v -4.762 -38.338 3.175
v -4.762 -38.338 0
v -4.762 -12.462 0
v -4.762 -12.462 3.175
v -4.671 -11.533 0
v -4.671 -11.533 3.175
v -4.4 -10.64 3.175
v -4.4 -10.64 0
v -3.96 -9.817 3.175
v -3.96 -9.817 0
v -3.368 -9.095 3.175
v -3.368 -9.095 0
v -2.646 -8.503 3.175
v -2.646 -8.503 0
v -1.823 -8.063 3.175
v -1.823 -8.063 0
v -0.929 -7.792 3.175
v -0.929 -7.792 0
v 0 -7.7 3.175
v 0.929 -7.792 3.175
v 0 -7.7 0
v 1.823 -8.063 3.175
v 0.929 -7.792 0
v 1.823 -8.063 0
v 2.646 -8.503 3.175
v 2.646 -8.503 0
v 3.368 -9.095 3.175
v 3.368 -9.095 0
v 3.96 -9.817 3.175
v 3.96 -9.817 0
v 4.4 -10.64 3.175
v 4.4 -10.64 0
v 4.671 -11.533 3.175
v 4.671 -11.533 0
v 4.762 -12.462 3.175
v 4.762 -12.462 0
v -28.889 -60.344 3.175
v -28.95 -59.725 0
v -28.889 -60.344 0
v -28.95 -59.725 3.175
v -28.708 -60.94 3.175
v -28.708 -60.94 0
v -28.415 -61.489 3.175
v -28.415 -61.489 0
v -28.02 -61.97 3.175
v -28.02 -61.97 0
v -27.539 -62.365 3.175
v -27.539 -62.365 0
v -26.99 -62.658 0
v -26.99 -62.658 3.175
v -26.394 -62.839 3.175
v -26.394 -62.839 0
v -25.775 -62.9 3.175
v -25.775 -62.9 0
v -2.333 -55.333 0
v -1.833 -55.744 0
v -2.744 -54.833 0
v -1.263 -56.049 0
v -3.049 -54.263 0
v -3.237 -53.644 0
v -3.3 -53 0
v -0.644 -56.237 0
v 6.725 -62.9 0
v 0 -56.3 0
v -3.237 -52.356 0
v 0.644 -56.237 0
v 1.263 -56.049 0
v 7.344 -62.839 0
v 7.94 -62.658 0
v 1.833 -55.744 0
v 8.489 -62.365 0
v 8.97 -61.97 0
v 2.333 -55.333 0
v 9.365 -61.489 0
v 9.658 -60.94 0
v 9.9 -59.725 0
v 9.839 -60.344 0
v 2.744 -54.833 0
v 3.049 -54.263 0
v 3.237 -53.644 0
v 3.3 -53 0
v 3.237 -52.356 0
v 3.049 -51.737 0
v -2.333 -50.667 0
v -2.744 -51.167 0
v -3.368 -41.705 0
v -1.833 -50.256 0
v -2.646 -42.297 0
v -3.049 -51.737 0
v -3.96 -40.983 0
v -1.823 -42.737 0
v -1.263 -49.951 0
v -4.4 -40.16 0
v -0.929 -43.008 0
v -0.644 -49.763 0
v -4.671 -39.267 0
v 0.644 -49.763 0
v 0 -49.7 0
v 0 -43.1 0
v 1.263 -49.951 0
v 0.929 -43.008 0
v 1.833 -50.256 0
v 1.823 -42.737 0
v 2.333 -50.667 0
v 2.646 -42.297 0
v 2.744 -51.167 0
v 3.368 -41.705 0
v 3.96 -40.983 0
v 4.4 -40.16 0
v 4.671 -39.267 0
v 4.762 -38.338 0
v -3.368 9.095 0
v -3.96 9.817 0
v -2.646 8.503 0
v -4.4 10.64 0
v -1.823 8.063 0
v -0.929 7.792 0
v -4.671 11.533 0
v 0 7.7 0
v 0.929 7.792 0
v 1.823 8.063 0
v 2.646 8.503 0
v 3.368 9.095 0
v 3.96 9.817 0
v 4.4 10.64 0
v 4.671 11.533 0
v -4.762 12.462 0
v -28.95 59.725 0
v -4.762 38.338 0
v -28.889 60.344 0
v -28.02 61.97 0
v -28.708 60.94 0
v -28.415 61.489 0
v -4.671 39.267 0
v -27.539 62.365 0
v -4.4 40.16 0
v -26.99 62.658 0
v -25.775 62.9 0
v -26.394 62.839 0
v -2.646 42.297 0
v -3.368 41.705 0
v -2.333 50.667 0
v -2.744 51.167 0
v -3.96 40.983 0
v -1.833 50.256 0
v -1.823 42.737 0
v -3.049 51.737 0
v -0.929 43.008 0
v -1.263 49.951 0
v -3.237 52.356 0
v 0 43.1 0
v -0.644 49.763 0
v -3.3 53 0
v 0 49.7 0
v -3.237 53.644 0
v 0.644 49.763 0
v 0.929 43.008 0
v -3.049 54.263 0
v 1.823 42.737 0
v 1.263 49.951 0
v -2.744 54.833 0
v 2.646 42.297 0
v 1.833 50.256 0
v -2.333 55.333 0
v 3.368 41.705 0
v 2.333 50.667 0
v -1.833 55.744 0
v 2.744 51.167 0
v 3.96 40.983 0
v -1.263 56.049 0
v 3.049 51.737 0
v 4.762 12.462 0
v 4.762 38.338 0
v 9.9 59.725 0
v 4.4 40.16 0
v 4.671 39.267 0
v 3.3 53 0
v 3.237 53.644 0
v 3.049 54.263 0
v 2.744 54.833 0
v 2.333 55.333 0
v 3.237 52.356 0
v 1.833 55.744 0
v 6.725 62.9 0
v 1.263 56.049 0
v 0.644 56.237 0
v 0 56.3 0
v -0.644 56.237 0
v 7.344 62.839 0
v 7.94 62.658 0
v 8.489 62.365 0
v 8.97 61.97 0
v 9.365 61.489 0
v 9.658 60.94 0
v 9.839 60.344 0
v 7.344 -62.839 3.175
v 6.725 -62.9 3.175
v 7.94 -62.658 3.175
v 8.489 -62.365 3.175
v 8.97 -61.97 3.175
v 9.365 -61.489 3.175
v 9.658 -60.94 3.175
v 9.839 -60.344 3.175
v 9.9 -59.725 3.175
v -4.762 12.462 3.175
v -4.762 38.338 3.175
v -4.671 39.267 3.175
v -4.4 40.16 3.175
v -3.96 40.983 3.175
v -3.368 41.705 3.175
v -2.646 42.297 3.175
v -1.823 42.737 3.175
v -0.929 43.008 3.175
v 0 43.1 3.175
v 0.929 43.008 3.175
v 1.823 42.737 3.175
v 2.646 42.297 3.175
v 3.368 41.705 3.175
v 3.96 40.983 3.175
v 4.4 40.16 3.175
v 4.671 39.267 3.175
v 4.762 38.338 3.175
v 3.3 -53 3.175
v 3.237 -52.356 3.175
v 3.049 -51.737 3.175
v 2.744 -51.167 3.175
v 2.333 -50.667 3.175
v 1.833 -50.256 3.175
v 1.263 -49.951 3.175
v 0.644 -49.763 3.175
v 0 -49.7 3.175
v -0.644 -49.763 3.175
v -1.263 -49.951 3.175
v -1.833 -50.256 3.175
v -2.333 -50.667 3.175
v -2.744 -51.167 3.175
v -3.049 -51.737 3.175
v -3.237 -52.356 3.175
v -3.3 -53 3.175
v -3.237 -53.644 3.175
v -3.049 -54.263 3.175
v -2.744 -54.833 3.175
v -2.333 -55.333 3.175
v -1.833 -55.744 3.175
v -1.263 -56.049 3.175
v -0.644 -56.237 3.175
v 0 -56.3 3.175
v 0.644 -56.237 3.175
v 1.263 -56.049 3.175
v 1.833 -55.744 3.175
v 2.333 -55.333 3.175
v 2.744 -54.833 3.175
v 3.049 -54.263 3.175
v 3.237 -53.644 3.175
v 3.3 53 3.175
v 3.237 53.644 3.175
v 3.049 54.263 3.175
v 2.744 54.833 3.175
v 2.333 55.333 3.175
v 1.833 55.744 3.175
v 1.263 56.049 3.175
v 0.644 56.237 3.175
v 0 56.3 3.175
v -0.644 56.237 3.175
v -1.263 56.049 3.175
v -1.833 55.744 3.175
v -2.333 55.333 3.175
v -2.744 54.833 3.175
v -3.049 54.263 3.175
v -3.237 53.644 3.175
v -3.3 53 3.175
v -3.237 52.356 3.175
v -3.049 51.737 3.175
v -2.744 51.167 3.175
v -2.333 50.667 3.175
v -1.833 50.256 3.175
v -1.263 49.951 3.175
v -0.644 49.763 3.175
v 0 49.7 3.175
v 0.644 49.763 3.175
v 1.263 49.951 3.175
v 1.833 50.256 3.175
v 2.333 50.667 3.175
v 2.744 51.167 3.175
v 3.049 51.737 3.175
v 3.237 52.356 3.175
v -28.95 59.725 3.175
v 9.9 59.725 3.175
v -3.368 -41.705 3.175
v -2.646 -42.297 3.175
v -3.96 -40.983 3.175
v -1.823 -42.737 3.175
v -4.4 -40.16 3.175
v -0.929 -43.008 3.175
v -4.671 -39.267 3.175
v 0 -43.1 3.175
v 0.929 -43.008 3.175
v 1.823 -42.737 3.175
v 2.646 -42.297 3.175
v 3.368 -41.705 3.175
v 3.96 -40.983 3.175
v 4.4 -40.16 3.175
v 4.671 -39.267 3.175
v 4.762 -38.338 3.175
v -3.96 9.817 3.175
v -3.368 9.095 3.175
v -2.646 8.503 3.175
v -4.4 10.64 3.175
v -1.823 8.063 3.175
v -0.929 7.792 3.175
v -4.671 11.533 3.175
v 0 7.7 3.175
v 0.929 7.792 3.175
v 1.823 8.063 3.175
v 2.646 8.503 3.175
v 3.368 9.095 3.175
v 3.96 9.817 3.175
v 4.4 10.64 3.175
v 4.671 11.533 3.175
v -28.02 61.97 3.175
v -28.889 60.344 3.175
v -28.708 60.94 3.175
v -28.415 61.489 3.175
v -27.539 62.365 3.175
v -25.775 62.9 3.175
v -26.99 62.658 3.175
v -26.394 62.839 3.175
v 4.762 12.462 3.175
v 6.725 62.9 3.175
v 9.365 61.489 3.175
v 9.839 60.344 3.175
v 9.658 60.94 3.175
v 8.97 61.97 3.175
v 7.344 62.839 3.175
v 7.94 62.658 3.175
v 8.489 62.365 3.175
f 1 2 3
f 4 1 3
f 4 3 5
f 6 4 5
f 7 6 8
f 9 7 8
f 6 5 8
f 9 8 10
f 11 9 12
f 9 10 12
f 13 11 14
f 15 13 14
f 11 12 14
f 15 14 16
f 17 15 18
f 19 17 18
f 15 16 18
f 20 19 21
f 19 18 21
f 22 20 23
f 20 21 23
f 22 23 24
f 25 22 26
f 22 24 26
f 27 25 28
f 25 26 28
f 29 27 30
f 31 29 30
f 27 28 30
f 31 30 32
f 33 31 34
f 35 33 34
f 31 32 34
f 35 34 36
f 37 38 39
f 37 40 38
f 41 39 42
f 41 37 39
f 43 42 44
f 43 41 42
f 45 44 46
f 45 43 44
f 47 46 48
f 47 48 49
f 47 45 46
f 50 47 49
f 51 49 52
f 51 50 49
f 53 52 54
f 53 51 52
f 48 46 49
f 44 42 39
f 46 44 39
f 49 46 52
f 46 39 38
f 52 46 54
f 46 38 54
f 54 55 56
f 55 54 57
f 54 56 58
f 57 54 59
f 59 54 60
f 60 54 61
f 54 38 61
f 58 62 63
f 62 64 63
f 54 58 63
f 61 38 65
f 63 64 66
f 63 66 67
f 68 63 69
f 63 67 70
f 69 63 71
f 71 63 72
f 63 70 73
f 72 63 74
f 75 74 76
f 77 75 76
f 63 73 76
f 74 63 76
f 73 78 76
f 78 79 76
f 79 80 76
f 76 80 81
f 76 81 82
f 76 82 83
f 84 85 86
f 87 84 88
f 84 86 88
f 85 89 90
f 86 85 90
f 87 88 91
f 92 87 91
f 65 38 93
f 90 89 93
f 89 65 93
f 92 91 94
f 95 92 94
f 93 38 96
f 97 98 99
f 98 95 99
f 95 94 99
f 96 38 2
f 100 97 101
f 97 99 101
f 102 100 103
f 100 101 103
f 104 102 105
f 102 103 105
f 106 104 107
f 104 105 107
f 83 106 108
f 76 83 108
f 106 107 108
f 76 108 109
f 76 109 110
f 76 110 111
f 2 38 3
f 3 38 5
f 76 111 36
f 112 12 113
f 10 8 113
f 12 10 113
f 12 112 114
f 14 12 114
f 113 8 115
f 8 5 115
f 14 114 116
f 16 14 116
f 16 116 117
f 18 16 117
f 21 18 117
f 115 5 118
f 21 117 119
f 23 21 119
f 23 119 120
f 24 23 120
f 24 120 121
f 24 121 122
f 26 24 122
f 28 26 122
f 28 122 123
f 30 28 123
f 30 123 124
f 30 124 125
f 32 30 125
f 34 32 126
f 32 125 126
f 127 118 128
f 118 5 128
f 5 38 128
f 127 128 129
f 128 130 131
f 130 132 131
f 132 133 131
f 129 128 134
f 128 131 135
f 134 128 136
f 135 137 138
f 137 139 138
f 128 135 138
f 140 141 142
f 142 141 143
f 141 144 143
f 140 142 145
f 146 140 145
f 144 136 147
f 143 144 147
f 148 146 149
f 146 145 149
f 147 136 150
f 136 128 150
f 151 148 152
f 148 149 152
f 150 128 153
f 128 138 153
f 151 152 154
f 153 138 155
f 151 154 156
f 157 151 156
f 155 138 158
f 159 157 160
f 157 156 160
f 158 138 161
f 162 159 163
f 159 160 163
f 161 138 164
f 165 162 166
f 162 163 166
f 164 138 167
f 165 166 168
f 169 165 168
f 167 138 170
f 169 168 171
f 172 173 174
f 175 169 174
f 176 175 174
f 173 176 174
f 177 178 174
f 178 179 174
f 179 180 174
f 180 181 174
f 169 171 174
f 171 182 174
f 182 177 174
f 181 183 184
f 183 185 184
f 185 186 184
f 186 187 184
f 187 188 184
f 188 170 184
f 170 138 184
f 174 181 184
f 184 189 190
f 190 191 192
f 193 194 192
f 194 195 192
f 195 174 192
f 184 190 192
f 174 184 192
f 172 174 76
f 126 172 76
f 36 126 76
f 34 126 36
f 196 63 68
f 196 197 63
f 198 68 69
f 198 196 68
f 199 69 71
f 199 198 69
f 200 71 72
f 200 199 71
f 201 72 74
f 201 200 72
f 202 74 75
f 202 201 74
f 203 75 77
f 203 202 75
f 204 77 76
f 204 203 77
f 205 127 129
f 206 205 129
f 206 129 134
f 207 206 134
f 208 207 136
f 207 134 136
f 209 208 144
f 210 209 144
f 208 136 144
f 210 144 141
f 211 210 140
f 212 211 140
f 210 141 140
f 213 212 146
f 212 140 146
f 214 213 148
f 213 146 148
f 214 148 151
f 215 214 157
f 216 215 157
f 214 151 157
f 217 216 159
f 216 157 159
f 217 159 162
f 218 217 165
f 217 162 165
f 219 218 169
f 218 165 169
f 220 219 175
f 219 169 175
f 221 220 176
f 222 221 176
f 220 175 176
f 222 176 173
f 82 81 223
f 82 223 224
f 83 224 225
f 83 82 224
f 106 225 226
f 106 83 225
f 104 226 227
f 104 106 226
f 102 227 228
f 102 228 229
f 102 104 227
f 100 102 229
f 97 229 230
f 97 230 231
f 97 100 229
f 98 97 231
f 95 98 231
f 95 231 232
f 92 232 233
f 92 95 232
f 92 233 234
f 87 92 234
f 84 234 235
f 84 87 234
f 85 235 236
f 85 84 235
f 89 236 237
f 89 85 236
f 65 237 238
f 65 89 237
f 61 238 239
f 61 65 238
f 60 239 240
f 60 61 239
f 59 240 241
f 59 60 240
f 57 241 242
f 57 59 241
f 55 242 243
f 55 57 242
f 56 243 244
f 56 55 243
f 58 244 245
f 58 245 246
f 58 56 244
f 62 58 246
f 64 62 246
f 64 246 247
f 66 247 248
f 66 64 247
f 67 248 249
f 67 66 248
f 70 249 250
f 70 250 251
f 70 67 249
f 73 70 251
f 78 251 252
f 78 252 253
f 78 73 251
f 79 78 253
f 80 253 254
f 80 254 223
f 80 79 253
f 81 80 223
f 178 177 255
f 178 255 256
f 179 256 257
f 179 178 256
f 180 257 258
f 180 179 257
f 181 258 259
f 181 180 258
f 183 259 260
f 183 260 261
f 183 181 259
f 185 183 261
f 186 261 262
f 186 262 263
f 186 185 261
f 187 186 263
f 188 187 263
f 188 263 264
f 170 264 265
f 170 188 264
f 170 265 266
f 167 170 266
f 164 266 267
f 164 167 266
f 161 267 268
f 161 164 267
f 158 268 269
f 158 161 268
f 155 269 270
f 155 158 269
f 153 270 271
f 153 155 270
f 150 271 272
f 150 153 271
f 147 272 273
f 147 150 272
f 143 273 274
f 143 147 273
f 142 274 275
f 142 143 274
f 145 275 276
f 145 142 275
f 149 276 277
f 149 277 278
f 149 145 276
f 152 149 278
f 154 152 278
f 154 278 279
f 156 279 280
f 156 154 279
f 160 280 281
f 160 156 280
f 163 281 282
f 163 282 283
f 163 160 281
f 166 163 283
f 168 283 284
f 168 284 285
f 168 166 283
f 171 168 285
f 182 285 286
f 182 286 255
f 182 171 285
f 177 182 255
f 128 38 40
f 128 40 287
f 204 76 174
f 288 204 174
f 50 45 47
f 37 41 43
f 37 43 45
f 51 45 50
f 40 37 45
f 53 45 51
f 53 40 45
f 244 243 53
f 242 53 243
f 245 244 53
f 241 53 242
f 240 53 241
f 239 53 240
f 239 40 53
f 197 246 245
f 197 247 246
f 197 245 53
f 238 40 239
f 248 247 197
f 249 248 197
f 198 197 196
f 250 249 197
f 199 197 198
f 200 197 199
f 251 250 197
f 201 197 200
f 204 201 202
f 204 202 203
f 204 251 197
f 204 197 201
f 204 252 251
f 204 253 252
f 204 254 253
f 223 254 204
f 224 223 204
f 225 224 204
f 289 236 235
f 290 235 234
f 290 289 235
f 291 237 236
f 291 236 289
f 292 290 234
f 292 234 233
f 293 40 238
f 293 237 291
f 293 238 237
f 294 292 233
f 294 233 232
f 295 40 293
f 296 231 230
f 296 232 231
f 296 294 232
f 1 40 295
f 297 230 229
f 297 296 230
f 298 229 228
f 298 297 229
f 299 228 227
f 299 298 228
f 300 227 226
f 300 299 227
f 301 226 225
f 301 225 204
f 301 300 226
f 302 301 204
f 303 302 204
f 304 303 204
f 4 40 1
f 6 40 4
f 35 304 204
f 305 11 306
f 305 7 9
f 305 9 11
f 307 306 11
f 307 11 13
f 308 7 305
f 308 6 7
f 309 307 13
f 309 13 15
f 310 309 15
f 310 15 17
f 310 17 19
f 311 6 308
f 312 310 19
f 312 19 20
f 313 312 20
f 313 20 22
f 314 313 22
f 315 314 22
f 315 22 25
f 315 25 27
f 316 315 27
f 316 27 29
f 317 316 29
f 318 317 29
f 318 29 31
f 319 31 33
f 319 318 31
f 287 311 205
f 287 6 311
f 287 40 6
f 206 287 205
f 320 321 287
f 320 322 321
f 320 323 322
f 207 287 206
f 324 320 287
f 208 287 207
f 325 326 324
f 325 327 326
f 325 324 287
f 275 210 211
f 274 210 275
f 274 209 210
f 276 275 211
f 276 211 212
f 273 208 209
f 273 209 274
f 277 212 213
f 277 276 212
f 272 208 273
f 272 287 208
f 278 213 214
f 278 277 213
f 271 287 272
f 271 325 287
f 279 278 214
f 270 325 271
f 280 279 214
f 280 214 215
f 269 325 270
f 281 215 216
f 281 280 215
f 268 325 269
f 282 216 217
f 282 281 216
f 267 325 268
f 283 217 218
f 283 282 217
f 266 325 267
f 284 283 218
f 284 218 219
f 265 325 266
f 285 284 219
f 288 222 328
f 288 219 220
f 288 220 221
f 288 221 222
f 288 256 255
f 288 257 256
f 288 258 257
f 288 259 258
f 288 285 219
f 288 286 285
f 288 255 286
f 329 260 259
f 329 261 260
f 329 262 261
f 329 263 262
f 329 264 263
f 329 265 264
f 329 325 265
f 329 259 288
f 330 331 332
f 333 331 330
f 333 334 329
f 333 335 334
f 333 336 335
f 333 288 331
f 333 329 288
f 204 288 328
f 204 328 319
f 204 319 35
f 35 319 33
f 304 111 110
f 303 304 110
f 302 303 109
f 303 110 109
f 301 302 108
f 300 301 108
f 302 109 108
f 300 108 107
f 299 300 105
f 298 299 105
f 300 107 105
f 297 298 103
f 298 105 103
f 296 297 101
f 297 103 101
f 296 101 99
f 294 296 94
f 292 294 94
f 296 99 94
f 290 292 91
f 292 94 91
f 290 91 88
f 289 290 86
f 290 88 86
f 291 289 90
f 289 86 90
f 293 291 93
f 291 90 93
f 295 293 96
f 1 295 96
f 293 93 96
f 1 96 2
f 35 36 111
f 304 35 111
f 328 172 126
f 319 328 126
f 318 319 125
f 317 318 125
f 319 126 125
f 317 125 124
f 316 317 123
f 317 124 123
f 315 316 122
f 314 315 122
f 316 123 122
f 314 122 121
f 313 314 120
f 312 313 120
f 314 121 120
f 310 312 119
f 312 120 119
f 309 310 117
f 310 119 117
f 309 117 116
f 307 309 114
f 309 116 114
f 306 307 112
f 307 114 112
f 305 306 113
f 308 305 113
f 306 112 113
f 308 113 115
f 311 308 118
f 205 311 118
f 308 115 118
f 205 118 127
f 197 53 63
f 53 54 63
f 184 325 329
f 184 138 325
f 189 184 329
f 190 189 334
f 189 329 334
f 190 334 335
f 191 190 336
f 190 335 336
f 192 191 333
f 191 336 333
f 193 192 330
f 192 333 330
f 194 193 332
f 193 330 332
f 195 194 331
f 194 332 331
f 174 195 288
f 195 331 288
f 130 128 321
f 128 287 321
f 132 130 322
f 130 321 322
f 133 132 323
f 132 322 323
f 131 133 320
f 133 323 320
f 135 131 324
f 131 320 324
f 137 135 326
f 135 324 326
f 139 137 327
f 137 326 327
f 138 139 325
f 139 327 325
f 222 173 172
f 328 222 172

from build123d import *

# Parameters (mm, degrees)
SKETCH1_W               = 19.800000024
SKETCH1_H               = 125.800000114
SKETCH1_R               = 3.3
SKETCH1_W_2             = 19.05
BOSS_EXTRUDE1_DEPTH     = 3.175
CUT_EXTRUDE1_DEPTH      = 70.315172458
CUT_EXTRUDE1_DEPTH_BACK = 70.315172458
FILLET1_R               = 3.175


with BuildPart() as part:
    # Sketch1 → Boss-Extrude1 (new body)
    # profile 1 of 2: a face of its own
    with BuildSketch(Plane.XY):
        Rectangle(SKETCH1_W, SKETCH1_H)
        with Locations((0, -53.000000045)):
            Circle(SKETCH1_R, mode=Mode.SUBTRACT)
        with Locations((0, 53.000000045)):
            Circle(SKETCH1_R, mode=Mode.SUBTRACT)
    # profile 2 of 2: a face of its own
    with BuildSketch(Plane.XY):
        with Locations((-19.425000012, 0)):
            Rectangle(SKETCH1_W_2, SKETCH1_H)
    extrude(amount=BOSS_EXTRUDE1_DEPTH)

    # Sketch6 → Cut-Extrude1 (cut, two sides: drawn at the far end of the back side and taken through both)
    with BuildSketch(Plane.XY.offset(3.175).offset(-CUT_EXTRUDE1_DEPTH_BACK)):
        with BuildLine():
            Line((4.7625, 38.337500033), (4.7625, 12.462499967))
            ThreePointArc((4.7625, 12.462499967), (0, 7.699999967), (-4.7625, 12.462499967))
            Line((-4.7625, 12.462499967), (-4.7625, 38.337500033))
            ThreePointArc((-4.7625, 38.337500033), (0, 43.100000033), (4.7625, 38.337500033))
        make_face()
        with BuildLine():
            Line((4.7625, -12.462499967), (4.7625, -38.337500033))
            ThreePointArc((4.7625, -38.337500033), (0, -43.100000033), (-4.7625, -38.337500033))
            Line((-4.7625, -38.337500033), (-4.7625, -12.462499967))
            ThreePointArc((-4.7625, -12.462499967), (0, -7.699999967), (4.7625, -12.462499967))
        make_face()
    extrude(amount=CUT_EXTRUDE1_DEPTH + CUT_EXTRUDE1_DEPTH_BACK, mode=Mode.SUBTRACT)

    # Fillet1
    fillet1_edges = [part.edges().sort_by_distance(p)[0] for p in [
        (9.900000012, 62.900000057, 1.5875),
        (9.900000012, -62.900000057, 1.5875),
        (-28.950000012, -62.900000057, 1.5875),
        (-28.950000012, 62.900000057, 1.5875),
    ]]
    fillet(fillet1_edges, radius=FILLET1_R)


solid = part.part
